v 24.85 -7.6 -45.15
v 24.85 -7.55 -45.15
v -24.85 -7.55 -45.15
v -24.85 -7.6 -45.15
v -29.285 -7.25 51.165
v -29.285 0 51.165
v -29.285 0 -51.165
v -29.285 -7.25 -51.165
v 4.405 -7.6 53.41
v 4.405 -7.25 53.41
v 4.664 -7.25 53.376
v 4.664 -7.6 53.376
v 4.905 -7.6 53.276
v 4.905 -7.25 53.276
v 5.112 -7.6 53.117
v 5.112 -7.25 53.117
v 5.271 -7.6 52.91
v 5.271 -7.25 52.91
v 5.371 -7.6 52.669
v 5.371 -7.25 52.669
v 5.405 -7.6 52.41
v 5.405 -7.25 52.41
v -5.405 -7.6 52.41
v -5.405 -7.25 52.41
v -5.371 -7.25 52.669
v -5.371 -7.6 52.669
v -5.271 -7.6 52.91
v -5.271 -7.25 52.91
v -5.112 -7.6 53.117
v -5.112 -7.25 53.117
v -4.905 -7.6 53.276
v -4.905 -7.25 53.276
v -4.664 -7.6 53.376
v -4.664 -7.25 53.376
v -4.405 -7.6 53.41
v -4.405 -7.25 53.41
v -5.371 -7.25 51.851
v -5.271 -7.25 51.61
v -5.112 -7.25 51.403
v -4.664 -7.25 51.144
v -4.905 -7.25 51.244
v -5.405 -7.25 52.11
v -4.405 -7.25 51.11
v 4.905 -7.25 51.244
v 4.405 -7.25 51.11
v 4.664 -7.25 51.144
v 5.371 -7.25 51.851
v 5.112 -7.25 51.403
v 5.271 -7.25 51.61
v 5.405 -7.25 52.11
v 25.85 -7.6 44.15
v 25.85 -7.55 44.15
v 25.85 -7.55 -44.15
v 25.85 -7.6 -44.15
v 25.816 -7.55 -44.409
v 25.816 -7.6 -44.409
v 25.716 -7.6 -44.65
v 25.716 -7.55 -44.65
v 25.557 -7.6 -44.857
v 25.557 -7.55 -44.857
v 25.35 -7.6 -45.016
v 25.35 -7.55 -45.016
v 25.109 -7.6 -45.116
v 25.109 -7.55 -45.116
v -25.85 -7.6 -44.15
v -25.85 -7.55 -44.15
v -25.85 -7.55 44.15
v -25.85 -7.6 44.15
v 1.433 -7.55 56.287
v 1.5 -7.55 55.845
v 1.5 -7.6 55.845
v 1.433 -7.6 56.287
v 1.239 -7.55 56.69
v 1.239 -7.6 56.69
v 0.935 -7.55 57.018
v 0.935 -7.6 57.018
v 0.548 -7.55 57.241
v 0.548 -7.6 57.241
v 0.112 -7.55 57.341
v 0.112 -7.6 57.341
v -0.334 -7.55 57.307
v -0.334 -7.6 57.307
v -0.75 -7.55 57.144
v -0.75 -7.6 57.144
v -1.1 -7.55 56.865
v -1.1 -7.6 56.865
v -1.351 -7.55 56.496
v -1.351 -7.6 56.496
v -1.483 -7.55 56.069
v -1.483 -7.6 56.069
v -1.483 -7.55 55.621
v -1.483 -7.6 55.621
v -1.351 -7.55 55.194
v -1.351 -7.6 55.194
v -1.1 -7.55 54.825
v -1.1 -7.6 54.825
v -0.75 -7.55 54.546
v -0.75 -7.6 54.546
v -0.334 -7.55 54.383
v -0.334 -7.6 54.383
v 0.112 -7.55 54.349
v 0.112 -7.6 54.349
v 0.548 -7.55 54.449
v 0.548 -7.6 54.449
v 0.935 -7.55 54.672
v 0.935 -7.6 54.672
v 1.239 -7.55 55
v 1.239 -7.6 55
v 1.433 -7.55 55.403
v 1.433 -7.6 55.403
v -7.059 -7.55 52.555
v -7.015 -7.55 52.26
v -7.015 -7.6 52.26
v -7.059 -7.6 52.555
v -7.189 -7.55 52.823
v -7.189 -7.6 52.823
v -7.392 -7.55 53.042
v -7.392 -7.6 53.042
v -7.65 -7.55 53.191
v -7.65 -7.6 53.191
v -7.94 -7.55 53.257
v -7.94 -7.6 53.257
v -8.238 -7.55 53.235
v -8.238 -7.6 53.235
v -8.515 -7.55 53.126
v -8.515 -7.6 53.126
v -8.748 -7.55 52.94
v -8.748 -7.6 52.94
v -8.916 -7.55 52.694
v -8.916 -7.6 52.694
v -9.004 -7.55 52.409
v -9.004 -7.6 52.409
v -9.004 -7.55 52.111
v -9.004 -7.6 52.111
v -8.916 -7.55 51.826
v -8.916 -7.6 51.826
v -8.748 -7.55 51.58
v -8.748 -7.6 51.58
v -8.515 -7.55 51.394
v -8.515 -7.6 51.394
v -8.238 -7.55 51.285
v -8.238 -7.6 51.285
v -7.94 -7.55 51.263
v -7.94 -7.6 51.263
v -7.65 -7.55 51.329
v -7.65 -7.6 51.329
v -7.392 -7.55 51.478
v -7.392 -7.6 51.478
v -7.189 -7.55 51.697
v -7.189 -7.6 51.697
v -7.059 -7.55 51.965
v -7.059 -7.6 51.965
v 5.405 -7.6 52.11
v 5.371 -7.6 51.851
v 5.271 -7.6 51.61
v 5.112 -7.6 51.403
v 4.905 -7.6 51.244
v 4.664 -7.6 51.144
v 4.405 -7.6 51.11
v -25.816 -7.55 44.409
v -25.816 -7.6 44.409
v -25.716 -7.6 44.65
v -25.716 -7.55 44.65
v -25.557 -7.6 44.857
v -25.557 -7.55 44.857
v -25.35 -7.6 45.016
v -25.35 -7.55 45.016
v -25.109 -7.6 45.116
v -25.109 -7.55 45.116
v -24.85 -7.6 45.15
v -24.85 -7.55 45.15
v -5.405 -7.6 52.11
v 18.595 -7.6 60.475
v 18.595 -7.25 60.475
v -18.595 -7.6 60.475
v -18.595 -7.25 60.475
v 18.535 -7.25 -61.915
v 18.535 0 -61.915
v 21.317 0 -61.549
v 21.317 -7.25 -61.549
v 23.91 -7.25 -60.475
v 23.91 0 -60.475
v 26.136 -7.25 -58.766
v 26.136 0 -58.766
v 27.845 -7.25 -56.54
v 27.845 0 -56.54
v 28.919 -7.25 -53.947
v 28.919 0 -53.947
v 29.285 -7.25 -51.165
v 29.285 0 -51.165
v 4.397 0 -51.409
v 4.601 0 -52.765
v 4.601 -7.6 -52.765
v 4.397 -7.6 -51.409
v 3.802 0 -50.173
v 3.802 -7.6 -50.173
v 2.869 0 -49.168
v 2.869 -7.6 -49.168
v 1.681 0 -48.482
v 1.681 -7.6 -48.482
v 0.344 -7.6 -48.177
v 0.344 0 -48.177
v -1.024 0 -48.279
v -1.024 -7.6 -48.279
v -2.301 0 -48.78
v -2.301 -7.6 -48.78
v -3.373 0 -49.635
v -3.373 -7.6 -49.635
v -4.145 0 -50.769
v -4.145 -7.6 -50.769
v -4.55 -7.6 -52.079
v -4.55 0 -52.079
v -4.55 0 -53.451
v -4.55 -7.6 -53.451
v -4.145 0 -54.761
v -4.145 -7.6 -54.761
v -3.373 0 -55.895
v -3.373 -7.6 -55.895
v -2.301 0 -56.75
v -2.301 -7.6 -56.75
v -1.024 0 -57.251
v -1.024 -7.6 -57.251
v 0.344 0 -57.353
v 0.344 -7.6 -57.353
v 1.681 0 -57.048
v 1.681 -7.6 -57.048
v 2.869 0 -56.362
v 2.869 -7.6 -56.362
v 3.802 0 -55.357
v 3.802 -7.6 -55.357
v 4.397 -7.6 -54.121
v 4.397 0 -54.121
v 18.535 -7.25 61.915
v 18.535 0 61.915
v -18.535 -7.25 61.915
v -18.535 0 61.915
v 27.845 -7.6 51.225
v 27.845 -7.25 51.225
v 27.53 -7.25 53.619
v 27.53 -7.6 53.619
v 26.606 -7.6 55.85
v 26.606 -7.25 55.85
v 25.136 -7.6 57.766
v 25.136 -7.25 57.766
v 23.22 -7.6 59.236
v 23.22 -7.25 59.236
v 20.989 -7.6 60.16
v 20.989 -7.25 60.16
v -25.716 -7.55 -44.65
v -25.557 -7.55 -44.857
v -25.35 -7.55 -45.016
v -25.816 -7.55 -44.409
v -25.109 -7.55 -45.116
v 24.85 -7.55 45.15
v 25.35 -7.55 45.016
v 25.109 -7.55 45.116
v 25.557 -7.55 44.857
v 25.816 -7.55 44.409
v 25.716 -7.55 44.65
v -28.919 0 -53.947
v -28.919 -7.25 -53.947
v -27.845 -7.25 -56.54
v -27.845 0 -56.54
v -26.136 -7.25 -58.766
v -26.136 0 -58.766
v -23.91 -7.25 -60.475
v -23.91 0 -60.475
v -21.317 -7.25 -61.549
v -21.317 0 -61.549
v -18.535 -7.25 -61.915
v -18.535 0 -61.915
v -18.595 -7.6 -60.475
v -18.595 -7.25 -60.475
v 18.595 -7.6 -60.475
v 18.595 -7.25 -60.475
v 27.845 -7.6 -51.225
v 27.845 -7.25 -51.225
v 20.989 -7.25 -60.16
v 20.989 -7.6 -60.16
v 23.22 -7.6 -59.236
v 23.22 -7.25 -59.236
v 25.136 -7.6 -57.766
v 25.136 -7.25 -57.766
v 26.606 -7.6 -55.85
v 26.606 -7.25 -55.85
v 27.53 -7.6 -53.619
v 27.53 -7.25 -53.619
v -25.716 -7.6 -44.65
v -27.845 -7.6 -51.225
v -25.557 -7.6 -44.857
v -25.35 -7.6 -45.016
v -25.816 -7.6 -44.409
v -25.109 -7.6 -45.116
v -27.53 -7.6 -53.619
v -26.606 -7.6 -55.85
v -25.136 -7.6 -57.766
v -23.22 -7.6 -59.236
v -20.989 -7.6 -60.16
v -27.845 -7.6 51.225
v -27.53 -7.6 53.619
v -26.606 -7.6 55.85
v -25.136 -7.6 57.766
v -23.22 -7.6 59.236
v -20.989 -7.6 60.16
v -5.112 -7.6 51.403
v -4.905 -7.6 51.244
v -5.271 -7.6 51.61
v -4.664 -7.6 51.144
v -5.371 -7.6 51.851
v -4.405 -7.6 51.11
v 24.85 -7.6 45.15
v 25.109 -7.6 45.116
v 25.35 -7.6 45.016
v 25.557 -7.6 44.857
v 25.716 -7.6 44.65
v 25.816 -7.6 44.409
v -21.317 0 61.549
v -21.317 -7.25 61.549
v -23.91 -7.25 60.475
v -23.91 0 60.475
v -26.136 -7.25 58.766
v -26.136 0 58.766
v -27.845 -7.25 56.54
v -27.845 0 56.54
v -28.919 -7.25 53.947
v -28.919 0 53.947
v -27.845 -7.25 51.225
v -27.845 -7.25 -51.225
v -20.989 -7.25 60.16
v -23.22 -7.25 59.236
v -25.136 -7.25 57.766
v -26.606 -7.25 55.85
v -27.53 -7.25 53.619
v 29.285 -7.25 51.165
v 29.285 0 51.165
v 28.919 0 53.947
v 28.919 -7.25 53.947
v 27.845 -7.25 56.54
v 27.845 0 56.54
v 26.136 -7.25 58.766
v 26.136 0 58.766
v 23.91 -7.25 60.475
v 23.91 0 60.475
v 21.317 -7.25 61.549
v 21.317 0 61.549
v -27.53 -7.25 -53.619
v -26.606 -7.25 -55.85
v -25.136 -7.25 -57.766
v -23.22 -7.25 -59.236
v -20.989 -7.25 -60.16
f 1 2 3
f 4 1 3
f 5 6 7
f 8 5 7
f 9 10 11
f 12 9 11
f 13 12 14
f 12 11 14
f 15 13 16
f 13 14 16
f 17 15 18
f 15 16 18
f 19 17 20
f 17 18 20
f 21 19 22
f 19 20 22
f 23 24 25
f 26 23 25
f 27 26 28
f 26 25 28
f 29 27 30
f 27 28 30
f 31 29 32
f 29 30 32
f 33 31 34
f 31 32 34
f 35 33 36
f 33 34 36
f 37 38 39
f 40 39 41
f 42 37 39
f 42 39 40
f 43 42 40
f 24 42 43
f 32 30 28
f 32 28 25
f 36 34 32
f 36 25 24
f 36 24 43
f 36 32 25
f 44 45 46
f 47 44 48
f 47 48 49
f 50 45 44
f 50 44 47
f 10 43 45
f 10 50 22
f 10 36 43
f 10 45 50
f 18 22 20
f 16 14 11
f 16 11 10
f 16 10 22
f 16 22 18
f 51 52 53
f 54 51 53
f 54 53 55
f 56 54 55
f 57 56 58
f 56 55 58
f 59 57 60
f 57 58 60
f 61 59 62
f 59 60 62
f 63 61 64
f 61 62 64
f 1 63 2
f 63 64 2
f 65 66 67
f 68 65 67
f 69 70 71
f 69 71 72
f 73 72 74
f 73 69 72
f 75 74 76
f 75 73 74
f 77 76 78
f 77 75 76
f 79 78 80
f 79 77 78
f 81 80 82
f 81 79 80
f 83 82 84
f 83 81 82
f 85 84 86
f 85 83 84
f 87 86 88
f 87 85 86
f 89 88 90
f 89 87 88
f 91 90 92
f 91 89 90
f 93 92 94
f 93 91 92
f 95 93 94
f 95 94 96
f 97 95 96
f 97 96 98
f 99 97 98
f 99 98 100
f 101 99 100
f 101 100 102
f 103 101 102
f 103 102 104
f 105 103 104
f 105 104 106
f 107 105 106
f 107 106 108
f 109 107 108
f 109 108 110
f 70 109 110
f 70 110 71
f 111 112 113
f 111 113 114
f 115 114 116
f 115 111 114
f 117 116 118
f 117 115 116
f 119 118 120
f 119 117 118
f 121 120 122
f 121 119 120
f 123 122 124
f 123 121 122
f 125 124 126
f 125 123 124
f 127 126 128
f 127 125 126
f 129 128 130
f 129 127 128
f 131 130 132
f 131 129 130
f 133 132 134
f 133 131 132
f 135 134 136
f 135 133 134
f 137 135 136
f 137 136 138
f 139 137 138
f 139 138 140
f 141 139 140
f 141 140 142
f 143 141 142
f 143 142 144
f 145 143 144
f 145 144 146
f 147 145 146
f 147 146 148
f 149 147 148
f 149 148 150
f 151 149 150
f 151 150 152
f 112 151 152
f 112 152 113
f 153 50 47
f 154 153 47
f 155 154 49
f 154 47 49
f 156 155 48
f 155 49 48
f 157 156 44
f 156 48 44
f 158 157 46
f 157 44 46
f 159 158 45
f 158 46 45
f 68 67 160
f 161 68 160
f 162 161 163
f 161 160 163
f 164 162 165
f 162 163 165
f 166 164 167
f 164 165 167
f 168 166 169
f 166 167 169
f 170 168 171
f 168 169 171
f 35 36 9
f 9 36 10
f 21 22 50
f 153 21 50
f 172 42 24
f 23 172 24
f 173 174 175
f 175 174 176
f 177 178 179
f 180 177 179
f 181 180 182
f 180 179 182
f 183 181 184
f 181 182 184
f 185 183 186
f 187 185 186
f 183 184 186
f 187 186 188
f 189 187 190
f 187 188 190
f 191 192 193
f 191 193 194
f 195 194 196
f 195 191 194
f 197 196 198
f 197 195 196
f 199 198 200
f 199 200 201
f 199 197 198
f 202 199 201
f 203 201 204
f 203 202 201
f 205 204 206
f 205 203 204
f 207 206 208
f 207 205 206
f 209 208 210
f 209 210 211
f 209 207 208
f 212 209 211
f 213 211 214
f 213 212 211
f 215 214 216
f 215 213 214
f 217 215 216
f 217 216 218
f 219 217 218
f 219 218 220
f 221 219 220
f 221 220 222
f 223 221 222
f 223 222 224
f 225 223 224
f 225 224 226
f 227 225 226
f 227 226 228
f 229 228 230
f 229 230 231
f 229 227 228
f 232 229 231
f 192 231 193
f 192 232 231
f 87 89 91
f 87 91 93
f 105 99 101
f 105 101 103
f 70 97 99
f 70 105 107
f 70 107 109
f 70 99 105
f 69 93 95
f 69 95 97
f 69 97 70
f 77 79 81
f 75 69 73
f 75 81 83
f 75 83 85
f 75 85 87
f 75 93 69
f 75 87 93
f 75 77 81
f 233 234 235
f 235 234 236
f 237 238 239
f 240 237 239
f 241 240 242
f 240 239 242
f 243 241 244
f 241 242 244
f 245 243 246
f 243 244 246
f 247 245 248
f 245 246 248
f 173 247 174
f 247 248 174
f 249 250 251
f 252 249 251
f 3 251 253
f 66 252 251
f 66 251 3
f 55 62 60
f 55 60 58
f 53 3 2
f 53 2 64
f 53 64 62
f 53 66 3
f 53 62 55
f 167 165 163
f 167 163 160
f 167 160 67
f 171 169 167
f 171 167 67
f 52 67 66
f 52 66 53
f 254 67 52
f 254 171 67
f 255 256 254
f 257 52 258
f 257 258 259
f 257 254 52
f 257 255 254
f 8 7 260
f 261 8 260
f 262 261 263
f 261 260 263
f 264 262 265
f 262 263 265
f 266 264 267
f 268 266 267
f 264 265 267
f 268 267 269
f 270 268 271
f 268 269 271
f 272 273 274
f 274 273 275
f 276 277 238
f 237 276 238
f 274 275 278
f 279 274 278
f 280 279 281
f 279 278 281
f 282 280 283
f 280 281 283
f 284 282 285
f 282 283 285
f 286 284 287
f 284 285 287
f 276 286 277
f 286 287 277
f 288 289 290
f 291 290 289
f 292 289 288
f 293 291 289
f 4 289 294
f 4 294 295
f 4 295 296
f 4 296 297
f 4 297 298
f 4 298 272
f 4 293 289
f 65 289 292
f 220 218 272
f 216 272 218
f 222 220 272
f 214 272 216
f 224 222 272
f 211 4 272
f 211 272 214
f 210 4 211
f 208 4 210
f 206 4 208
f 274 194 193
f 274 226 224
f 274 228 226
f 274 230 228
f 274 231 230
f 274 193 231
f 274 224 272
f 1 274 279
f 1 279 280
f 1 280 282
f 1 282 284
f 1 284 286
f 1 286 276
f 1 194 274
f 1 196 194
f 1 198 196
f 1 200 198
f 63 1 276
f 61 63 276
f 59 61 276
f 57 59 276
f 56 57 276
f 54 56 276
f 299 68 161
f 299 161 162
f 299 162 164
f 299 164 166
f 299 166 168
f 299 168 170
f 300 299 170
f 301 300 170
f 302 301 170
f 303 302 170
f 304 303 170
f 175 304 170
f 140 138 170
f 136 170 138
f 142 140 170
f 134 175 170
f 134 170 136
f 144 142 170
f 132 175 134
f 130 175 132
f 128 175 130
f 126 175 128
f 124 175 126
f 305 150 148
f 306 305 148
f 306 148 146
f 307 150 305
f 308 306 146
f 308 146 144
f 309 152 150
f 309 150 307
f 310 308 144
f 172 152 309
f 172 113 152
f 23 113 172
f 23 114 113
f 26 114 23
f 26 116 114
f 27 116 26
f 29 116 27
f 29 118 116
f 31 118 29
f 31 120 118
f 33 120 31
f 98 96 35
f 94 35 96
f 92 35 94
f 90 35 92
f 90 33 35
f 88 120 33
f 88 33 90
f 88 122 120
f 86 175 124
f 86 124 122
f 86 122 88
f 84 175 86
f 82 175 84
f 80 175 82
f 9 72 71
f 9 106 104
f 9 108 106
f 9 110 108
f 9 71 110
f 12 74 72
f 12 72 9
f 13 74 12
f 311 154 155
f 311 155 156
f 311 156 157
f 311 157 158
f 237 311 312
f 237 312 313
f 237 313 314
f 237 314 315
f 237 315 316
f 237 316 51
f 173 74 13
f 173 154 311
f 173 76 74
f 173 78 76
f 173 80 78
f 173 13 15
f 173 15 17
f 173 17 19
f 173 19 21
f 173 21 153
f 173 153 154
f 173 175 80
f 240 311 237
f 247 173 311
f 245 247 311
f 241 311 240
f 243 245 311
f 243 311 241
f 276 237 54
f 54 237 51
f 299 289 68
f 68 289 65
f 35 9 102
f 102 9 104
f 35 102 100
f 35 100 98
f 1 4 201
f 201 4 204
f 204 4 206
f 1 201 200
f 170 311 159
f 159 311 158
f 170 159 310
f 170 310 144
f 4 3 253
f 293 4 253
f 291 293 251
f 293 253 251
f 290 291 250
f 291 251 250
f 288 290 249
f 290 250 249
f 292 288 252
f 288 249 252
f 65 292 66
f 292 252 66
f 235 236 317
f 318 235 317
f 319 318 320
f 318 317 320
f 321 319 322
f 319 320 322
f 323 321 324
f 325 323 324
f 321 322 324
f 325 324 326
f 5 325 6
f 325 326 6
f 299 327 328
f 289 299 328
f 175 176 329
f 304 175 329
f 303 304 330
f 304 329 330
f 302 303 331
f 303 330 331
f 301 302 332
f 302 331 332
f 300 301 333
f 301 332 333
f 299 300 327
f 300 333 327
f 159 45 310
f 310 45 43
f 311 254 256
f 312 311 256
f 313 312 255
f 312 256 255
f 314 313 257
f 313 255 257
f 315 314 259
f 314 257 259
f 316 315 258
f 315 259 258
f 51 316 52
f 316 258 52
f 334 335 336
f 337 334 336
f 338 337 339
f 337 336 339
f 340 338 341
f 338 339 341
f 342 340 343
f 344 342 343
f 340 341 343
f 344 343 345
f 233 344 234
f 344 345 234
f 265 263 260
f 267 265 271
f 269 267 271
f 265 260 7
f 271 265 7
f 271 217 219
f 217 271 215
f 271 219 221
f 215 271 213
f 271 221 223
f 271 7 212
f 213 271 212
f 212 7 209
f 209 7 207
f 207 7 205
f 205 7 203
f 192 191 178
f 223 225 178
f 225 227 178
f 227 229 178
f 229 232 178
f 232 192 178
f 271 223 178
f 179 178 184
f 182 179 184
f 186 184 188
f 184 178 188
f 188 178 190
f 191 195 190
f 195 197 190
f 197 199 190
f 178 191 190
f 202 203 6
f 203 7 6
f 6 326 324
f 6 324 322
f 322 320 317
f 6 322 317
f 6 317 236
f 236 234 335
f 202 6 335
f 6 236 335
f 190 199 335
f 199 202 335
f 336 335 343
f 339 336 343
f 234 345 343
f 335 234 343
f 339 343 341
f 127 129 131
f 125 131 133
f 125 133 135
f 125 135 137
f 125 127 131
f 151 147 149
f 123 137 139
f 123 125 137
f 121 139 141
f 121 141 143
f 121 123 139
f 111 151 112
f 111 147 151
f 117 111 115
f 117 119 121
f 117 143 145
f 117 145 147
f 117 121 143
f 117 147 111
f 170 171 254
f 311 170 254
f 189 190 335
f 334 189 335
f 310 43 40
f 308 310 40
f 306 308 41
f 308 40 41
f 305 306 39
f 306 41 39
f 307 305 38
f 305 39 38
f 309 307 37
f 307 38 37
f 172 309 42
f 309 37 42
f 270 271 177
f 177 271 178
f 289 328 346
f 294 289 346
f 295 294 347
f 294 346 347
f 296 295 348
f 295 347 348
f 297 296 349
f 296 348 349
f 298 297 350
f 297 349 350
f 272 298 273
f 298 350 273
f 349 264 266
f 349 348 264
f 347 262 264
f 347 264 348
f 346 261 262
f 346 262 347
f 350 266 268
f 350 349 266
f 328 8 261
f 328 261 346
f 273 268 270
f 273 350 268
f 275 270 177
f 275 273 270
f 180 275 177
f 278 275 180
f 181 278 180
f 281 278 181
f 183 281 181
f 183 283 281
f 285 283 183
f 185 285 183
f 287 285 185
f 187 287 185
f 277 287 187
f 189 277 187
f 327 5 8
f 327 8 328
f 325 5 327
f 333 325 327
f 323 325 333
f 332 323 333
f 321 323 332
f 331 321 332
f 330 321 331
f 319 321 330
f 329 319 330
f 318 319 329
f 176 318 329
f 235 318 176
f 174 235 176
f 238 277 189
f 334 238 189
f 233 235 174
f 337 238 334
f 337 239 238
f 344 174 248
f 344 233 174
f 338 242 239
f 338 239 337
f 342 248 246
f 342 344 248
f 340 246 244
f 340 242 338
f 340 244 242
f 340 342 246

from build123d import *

# Parameters (mm, degrees)
F0_R     = 4.601152
F0_R_2   = 1
F0_R_3   = 1.5
F1_DEPTH = 7.6
F2_DEPTH = 7.25
F3_DEPTH = 7.55
F4_DEPTH = 7.55
F5_DEPTH = 7.55
F6_DEPTH = 7.25
F0_R_4   = 4.190001
F7_DEPTH = 7


with BuildPart() as f1:
    # F0 (on Front) → F1 (new body)
    with BuildSketch(Plane.XZ):
        with BuildLine():
            Line((-18.595, -60.475), (18.595, -60.475))
            ThreePointArc((18.595, -60.475), (25.135738, -57.765738), (27.845, -51.225))
            Line((27.845, -51.225), (27.845, 51.225))
            ThreePointArc((27.845, 51.225), (25.135738, 57.765738), (18.595, 60.475))
            Line((18.595, 60.475), (-18.595, 60.475))
            ThreePointArc((-18.595, 60.475), (-25.135738, 57.765738), (-27.845, 51.225))
            Line((-27.845, 51.225), (-27.845, -51.225))
            ThreePointArc((-27.845, -51.225), (-25.135738, -57.765738), (-18.595, -60.475))
        make_face()
        with Locations((0, -52.765)):
            Circle(F0_R, mode=Mode.SUBTRACT)
        with Locations((-8.015, 52.259863)):
            Circle(F0_R_2, mode=Mode.SUBTRACT)
        with BuildLine():
            ThreePointArc((25.85, -44.15), (25.557107, -44.857107), (24.85, -45.15))
            Line((24.85, -45.15), (-24.85, -45.15))
            ThreePointArc((-24.85, -45.15), (-25.557107, -44.857107), (-25.85, -44.15))
            Line((-25.85, -44.15), (-25.85, 44.15))
            ThreePointArc((-25.85, 44.15), (-25.557107, 44.857107), (-24.85, 45.15))
            Line((-24.85, 45.15), (24.85, 45.15))
            ThreePointArc((24.85, 45.15), (25.557107, 44.857107), (25.85, 44.15))
            Line((25.85, 44.15), (25.85, -44.15))
        make_face(mode=Mode.SUBTRACT)
        with BuildLine():
            Line((-4.405, 53.409863), (4.405, 53.409863))
            ThreePointArc((4.405, 53.409863), (5.112107, 53.11697), (5.405, 52.409863))
            Line((5.405, 52.409863), (5.405, 52.109863))
            ThreePointArc((5.405, 52.109863), (5.112107, 51.402756), (4.405, 51.109863))
            Line((4.405, 51.109863), (-4.405, 51.109863))
            ThreePointArc((-4.405, 51.109863), (-5.112107, 51.402756), (-5.405, 52.109863))
            Line((-5.405, 52.109863), (-5.405, 52.409863))
            ThreePointArc((-5.405, 52.409863), (-5.112107, 53.11697), (-4.405, 53.409863))
        make_face(mode=Mode.SUBTRACT)
        with Locations((0, 55.845)):
            Circle(F0_R_3, mode=Mode.SUBTRACT)
    extrude(amount=F1_DEPTH)

    # F0 (on Front) → F2 (join)
    with BuildSketch(Plane.XZ):
        with BuildLine():
            Line((-18.535, -61.915), (18.535, -61.915))
            ThreePointArc((18.535, -61.915), (26.136398, -58.766398), (29.285, -51.165))
            Line((29.285, -51.165), (29.285, 51.165))
            ThreePointArc((29.285, 51.165), (26.136398, 58.766398), (18.535, 61.915))
            Line((18.535, 61.915), (-18.535, 61.915))
            ThreePointArc((-18.535, 61.915), (-26.136398, 58.766398), (-29.285, 51.165))
            Line((-29.285, 51.165), (-29.285, -51.165))
            ThreePointArc((-29.285, -51.165), (-26.136398, -58.766398), (-18.535, -61.915))
        make_face()
        with BuildLine():
            ThreePointArc((27.845, -51.225), (25.135738, -57.765738), (18.595, -60.475))
            Line((18.595, -60.475), (-18.595, -60.475))
            ThreePointArc((-18.595, -60.475), (-25.135738, -57.765738), (-27.845, -51.225))
            Line((-27.845, -51.225), (-27.845, 51.225))
            ThreePointArc((-27.845, 51.225), (-25.135738, 57.765738), (-18.595, 60.475))
            Line((-18.595, 60.475), (18.595, 60.475))
            ThreePointArc((18.595, 60.475), (25.135738, 57.765738), (27.845, 51.225))
            Line((27.845, 51.225), (27.845, -51.225))
        make_face(mode=Mode.SUBTRACT)
    extrude(amount=F2_DEPTH)

    # F0 (on Front) → F3 (join)
    with BuildSketch(Plane.XZ):
        with BuildLine():
            Line((-24.85, -45.15), (24.85, -45.15))
            ThreePointArc((24.85, -45.15), (25.557107, -44.857107), (25.85, -44.15))
            Line((25.85, -44.15), (25.85, 44.15))
            ThreePointArc((25.85, 44.15), (25.557107, 44.857107), (24.85, 45.15))
            Line((24.85, 45.15), (-24.85, 45.15))
            ThreePointArc((-24.85, 45.15), (-25.557107, 44.857107), (-25.85, 44.15))
            Line((-25.85, 44.15), (-25.85, -44.15))
            ThreePointArc((-25.85, -44.15), (-25.557107, -44.857107), (-24.85, -45.15))
        make_face()
    extrude(amount=F3_DEPTH)

    # F0 (on Front) → F4 (join)
    with BuildSketch(Plane.XZ):
        with Locations((0, 55.845)):
            Circle(F0_R_3)
    extrude(amount=F4_DEPTH)

    # F0 (on Front) → F5 (join)
    with BuildSketch(Plane.XZ):
        with Locations((-8.015, 52.259863)):
            Circle(F0_R_2)
    extrude(amount=F5_DEPTH)

    # F0 (on Front) → F6 (join)
    with BuildSketch(Plane.XZ):
        with BuildLine():
            ThreePointArc((5.405, 52.409863), (5.112107, 53.11697), (4.405, 53.409863))
            Line((4.405, 53.409863), (-4.405, 53.409863))
            ThreePointArc((-4.405, 53.409863), (-5.112107, 53.11697), (-5.405, 52.409863))
            Line((-5.405, 52.409863), (-5.405, 52.109863))
            ThreePointArc((-5.405, 52.109863), (-5.112107, 51.402756), (-4.405, 51.109863))
            Line((-4.405, 51.109863), (4.405, 51.109863))
            ThreePointArc((4.405, 51.109863), (5.112107, 51.402756), (5.405, 52.109863))
            Line((5.405, 52.109863), (5.405, 52.409863))
        make_face()
    extrude(amount=F6_DEPTH)


with BuildPart() as f7:
    # F0 (on Front) → F7 (new body)
    with BuildSketch(Plane.XZ):
        with Locations((0, -52.765)):
            Circle(F0_R_4)
    extrude(amount=F7_DEPTH)


solid = f1.part
